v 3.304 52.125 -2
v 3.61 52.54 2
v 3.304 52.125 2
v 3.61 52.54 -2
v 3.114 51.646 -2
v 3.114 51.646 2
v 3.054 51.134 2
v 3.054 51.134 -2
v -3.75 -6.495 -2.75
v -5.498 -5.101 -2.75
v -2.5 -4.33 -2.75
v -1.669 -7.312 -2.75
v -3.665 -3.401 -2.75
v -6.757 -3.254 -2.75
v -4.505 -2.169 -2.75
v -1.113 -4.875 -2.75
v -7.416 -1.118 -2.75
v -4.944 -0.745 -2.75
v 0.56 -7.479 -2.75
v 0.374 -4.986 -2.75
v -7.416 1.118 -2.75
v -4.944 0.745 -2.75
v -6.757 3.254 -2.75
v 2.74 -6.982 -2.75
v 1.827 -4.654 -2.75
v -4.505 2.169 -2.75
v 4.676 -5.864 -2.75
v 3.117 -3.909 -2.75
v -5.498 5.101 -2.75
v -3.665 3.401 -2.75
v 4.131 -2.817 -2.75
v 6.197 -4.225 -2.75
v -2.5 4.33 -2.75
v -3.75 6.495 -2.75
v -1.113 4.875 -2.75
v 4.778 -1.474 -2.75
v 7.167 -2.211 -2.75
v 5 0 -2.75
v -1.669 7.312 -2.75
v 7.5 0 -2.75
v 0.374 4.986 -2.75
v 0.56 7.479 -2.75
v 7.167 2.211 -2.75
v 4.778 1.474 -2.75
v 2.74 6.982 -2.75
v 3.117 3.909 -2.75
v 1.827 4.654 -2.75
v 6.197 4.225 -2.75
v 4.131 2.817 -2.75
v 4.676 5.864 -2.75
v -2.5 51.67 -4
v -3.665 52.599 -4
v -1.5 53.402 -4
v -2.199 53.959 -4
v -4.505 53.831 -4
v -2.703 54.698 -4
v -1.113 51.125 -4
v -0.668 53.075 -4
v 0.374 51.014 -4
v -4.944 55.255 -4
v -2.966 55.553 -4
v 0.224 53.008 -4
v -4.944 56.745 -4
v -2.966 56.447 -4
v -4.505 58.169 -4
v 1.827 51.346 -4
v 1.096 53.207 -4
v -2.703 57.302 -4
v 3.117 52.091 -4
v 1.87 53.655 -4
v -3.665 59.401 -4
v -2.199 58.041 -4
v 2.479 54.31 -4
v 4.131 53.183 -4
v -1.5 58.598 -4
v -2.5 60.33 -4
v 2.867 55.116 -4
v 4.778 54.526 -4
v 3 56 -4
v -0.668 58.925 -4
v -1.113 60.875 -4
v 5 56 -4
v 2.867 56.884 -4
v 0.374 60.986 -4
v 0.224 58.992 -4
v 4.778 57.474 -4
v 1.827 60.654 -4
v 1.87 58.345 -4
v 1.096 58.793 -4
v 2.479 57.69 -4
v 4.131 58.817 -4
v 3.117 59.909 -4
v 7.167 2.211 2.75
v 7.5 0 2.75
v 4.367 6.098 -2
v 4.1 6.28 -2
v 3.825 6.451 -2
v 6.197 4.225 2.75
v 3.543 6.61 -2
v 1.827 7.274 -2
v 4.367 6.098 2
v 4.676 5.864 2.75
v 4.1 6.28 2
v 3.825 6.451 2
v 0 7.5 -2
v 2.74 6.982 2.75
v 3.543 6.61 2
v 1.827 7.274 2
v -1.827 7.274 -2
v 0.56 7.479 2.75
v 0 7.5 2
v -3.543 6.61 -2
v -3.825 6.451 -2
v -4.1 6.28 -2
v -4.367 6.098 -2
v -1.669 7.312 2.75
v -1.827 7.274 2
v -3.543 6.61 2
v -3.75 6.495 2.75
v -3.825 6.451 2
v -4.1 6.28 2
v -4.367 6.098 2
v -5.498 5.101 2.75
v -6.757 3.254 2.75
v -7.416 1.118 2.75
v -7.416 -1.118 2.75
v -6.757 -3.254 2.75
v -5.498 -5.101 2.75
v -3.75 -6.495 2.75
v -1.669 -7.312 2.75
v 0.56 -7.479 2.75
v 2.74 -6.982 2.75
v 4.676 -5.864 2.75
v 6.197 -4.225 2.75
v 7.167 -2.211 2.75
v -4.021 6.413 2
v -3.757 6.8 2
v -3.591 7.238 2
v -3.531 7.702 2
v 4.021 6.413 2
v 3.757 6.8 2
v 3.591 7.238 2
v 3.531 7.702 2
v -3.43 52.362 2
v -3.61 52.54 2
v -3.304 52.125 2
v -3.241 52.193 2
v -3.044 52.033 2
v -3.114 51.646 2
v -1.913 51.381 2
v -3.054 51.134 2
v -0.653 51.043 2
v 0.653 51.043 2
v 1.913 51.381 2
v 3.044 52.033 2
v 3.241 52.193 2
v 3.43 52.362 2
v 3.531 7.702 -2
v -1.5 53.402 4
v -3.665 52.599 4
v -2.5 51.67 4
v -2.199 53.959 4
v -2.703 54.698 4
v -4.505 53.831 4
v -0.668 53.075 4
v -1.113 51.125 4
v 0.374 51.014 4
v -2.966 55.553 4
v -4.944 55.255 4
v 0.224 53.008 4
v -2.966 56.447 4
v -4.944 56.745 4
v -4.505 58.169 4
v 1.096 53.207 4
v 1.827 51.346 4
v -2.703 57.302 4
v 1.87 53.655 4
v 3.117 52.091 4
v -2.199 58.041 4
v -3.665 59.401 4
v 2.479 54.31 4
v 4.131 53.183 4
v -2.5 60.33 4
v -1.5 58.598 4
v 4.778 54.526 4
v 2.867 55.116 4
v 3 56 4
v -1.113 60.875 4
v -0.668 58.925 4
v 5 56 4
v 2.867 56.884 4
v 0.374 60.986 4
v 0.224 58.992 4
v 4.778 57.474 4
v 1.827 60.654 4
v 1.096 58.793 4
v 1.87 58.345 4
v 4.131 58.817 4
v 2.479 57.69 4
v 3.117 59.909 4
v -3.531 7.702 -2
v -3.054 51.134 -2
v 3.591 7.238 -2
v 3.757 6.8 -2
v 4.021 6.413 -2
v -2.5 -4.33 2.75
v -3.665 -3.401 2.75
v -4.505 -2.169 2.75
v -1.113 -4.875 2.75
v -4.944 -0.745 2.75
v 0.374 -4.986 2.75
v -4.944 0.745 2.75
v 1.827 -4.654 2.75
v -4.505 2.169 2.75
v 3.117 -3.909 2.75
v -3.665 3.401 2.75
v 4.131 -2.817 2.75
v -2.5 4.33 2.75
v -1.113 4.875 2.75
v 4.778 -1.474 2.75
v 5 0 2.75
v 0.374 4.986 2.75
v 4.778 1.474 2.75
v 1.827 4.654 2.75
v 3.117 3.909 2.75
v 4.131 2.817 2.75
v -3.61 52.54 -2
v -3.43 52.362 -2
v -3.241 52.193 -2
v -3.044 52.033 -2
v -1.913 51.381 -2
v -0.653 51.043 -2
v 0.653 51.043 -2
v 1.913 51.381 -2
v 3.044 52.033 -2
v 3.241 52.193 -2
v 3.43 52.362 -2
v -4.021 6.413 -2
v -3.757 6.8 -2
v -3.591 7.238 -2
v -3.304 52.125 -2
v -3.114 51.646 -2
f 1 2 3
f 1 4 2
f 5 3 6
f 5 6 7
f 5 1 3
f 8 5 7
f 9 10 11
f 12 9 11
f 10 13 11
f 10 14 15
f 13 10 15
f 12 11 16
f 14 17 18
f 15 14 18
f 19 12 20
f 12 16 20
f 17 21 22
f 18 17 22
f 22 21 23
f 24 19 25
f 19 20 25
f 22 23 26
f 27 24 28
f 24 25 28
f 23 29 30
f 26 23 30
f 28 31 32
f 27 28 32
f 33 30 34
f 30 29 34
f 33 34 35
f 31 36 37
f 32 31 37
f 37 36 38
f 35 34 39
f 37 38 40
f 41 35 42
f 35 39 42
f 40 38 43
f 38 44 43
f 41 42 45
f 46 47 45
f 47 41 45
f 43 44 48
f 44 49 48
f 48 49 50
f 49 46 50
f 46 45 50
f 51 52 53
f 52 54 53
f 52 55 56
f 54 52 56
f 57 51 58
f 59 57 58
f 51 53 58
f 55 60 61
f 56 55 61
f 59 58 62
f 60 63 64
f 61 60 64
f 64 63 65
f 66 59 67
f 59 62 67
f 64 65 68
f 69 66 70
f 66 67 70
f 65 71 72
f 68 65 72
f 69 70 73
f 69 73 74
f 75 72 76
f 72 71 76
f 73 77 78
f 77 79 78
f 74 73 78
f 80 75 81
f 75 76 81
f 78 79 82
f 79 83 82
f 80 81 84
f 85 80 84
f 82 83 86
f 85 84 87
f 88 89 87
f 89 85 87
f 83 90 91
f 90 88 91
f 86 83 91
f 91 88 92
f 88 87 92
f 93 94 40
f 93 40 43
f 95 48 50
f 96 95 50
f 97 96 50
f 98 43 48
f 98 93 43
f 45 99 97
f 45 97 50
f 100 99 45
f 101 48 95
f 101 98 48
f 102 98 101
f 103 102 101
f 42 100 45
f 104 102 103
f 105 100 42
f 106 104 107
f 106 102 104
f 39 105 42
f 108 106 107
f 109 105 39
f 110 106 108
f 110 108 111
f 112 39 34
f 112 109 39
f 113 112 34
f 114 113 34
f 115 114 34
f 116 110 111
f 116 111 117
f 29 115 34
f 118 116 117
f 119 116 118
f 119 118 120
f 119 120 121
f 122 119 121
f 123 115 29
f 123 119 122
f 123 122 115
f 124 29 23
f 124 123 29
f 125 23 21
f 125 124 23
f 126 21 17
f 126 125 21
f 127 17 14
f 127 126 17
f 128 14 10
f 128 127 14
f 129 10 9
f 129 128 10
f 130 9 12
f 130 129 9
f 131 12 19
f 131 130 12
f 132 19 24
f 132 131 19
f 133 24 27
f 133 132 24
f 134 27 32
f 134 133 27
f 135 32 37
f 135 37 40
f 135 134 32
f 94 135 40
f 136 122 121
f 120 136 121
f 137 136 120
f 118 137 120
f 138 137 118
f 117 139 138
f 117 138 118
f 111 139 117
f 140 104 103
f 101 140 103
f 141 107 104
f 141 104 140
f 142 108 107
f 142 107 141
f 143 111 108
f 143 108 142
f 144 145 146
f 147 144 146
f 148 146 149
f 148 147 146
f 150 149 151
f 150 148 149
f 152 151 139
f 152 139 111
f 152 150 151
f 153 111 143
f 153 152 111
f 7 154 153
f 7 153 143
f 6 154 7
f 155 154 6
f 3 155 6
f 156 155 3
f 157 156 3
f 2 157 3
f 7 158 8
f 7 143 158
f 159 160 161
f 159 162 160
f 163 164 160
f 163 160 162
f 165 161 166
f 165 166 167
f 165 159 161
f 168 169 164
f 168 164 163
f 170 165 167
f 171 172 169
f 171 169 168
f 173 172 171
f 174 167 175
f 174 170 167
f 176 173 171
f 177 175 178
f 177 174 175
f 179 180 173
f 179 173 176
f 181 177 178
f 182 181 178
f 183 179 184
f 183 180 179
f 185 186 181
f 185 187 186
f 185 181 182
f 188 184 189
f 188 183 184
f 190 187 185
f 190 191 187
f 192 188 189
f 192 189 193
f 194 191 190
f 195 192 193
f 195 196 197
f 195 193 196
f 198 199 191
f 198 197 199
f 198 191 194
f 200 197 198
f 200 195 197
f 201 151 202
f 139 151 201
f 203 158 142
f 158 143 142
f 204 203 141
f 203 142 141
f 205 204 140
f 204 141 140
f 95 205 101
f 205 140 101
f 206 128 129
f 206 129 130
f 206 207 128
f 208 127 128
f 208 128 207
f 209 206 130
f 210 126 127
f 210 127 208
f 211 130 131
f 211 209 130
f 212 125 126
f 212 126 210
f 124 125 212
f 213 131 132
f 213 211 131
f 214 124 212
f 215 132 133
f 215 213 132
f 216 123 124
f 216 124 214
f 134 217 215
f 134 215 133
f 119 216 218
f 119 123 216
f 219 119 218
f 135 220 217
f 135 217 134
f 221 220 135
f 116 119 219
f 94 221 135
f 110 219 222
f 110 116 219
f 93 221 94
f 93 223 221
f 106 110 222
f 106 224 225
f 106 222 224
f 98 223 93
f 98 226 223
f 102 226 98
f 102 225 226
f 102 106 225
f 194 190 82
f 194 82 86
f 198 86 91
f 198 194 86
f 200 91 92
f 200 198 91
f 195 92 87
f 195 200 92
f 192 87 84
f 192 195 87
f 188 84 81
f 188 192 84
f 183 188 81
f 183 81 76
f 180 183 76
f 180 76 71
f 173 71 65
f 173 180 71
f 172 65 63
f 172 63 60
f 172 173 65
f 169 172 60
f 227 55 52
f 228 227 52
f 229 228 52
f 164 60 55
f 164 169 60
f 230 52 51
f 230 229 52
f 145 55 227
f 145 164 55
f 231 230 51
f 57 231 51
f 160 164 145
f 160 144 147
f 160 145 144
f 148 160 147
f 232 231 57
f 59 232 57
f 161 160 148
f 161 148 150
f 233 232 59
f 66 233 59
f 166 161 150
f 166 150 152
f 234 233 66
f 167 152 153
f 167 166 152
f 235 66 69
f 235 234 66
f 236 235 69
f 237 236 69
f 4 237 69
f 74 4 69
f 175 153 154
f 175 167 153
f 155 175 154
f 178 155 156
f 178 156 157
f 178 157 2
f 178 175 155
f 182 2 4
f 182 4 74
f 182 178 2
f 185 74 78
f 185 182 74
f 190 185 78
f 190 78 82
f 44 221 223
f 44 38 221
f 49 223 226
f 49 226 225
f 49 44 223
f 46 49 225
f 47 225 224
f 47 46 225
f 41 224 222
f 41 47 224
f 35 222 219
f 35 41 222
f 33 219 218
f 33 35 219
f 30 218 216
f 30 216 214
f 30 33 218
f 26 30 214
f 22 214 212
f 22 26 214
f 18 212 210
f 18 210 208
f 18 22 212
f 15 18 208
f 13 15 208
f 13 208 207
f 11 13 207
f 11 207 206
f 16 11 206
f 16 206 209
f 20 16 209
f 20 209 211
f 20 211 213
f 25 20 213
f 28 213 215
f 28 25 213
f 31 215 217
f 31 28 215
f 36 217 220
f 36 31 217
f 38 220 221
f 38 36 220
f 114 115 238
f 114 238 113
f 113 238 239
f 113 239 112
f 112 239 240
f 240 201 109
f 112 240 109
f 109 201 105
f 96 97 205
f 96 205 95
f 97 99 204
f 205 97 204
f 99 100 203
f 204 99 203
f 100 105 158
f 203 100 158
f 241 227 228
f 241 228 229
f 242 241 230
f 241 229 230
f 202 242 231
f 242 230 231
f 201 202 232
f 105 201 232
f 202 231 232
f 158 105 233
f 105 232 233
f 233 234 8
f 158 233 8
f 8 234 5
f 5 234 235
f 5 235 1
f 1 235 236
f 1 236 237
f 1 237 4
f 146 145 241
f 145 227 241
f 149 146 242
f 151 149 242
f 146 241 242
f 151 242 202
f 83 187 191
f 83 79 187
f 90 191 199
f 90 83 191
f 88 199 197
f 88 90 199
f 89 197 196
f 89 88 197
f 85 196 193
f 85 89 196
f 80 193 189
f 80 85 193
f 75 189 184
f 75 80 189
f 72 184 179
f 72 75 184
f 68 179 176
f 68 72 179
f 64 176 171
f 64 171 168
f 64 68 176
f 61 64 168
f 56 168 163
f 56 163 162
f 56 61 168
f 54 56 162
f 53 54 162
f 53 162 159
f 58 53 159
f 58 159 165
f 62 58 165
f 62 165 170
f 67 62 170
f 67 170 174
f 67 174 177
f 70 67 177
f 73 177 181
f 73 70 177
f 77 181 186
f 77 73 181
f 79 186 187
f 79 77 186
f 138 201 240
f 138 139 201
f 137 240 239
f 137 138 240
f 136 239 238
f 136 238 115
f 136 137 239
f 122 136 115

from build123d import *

# Parameters (mm, degrees)
SKETCH1_R           = 7.5
SKETCH1_R_2         = 5
BOSS_EXTRUDE1_DEPTH = 2.75
SKETCH2_R           = 5
SKETCH2_R_2         = 3
BOSS_EXTRUDE2_DEPTH = 4
BOSS_EXTRUDE3_DEPTH = 2
FILLET1_R           = 2


with BuildPart() as part:
    # Sketch1 → Boss-Extrude1 (new, symmetric)
    with BuildSketch(Plane.XY):
        Circle(SKETCH1_R)
        Circle(SKETCH1_R_2, mode=Mode.SUBTRACT)
    extrude(amount=BOSS_EXTRUDE1_DEPTH, both=True)



with BuildPart() as body_2:
    # Sketch2 → Boss-Extrude2 (new, symmetric)
    with BuildSketch(Plane.XY):
        with Locations((0, 56)):
            Circle(SKETCH2_R)
        with Locations((0, 56)):
            Circle(SKETCH2_R_2, mode=Mode.SUBTRACT)
    extrude(amount=BOSS_EXTRUDE2_DEPTH, both=True)


with BuildPart() as part_1:
    add(part.part)

    add(body_2.part)  # Boss-Extrude3 merges body 2
    # Sketch3 → Boss-Extrude3 (add, symmetric)
    with BuildSketch(Plane.XY):
        with BuildLine():
            Line((-3.043800059, 52.033227861), (-3.543272067, 6.610236233))
            ThreePointArc((-3.543272067, 6.610236233), (0, 7.5), (3.543272067, 6.610236233))
            Line((3.543272067, 6.610236233), (3.043800059, 52.033227861))
            ThreePointArc((3.043800059, 52.033227861), (0, 51), (-3.043800059, 52.033227861))
        make_face()
    extrude(amount=BOSS_EXTRUDE3_DEPTH, both=True)

    # Fillet1
    fillet1_edges = [part_1.edges().sort_by_distance(p)[0] for p in [
        (3.043800059, 52.033227861, 0),
        (-3.043800059, 52.033227861, 0),
        (-3.543272067, 6.610236233, 0),
        (3.543272067, 6.610236233, 0),
    ]]
    fillet(fillet1_edges, radius=FILLET1_R)


solid = part_1.part
